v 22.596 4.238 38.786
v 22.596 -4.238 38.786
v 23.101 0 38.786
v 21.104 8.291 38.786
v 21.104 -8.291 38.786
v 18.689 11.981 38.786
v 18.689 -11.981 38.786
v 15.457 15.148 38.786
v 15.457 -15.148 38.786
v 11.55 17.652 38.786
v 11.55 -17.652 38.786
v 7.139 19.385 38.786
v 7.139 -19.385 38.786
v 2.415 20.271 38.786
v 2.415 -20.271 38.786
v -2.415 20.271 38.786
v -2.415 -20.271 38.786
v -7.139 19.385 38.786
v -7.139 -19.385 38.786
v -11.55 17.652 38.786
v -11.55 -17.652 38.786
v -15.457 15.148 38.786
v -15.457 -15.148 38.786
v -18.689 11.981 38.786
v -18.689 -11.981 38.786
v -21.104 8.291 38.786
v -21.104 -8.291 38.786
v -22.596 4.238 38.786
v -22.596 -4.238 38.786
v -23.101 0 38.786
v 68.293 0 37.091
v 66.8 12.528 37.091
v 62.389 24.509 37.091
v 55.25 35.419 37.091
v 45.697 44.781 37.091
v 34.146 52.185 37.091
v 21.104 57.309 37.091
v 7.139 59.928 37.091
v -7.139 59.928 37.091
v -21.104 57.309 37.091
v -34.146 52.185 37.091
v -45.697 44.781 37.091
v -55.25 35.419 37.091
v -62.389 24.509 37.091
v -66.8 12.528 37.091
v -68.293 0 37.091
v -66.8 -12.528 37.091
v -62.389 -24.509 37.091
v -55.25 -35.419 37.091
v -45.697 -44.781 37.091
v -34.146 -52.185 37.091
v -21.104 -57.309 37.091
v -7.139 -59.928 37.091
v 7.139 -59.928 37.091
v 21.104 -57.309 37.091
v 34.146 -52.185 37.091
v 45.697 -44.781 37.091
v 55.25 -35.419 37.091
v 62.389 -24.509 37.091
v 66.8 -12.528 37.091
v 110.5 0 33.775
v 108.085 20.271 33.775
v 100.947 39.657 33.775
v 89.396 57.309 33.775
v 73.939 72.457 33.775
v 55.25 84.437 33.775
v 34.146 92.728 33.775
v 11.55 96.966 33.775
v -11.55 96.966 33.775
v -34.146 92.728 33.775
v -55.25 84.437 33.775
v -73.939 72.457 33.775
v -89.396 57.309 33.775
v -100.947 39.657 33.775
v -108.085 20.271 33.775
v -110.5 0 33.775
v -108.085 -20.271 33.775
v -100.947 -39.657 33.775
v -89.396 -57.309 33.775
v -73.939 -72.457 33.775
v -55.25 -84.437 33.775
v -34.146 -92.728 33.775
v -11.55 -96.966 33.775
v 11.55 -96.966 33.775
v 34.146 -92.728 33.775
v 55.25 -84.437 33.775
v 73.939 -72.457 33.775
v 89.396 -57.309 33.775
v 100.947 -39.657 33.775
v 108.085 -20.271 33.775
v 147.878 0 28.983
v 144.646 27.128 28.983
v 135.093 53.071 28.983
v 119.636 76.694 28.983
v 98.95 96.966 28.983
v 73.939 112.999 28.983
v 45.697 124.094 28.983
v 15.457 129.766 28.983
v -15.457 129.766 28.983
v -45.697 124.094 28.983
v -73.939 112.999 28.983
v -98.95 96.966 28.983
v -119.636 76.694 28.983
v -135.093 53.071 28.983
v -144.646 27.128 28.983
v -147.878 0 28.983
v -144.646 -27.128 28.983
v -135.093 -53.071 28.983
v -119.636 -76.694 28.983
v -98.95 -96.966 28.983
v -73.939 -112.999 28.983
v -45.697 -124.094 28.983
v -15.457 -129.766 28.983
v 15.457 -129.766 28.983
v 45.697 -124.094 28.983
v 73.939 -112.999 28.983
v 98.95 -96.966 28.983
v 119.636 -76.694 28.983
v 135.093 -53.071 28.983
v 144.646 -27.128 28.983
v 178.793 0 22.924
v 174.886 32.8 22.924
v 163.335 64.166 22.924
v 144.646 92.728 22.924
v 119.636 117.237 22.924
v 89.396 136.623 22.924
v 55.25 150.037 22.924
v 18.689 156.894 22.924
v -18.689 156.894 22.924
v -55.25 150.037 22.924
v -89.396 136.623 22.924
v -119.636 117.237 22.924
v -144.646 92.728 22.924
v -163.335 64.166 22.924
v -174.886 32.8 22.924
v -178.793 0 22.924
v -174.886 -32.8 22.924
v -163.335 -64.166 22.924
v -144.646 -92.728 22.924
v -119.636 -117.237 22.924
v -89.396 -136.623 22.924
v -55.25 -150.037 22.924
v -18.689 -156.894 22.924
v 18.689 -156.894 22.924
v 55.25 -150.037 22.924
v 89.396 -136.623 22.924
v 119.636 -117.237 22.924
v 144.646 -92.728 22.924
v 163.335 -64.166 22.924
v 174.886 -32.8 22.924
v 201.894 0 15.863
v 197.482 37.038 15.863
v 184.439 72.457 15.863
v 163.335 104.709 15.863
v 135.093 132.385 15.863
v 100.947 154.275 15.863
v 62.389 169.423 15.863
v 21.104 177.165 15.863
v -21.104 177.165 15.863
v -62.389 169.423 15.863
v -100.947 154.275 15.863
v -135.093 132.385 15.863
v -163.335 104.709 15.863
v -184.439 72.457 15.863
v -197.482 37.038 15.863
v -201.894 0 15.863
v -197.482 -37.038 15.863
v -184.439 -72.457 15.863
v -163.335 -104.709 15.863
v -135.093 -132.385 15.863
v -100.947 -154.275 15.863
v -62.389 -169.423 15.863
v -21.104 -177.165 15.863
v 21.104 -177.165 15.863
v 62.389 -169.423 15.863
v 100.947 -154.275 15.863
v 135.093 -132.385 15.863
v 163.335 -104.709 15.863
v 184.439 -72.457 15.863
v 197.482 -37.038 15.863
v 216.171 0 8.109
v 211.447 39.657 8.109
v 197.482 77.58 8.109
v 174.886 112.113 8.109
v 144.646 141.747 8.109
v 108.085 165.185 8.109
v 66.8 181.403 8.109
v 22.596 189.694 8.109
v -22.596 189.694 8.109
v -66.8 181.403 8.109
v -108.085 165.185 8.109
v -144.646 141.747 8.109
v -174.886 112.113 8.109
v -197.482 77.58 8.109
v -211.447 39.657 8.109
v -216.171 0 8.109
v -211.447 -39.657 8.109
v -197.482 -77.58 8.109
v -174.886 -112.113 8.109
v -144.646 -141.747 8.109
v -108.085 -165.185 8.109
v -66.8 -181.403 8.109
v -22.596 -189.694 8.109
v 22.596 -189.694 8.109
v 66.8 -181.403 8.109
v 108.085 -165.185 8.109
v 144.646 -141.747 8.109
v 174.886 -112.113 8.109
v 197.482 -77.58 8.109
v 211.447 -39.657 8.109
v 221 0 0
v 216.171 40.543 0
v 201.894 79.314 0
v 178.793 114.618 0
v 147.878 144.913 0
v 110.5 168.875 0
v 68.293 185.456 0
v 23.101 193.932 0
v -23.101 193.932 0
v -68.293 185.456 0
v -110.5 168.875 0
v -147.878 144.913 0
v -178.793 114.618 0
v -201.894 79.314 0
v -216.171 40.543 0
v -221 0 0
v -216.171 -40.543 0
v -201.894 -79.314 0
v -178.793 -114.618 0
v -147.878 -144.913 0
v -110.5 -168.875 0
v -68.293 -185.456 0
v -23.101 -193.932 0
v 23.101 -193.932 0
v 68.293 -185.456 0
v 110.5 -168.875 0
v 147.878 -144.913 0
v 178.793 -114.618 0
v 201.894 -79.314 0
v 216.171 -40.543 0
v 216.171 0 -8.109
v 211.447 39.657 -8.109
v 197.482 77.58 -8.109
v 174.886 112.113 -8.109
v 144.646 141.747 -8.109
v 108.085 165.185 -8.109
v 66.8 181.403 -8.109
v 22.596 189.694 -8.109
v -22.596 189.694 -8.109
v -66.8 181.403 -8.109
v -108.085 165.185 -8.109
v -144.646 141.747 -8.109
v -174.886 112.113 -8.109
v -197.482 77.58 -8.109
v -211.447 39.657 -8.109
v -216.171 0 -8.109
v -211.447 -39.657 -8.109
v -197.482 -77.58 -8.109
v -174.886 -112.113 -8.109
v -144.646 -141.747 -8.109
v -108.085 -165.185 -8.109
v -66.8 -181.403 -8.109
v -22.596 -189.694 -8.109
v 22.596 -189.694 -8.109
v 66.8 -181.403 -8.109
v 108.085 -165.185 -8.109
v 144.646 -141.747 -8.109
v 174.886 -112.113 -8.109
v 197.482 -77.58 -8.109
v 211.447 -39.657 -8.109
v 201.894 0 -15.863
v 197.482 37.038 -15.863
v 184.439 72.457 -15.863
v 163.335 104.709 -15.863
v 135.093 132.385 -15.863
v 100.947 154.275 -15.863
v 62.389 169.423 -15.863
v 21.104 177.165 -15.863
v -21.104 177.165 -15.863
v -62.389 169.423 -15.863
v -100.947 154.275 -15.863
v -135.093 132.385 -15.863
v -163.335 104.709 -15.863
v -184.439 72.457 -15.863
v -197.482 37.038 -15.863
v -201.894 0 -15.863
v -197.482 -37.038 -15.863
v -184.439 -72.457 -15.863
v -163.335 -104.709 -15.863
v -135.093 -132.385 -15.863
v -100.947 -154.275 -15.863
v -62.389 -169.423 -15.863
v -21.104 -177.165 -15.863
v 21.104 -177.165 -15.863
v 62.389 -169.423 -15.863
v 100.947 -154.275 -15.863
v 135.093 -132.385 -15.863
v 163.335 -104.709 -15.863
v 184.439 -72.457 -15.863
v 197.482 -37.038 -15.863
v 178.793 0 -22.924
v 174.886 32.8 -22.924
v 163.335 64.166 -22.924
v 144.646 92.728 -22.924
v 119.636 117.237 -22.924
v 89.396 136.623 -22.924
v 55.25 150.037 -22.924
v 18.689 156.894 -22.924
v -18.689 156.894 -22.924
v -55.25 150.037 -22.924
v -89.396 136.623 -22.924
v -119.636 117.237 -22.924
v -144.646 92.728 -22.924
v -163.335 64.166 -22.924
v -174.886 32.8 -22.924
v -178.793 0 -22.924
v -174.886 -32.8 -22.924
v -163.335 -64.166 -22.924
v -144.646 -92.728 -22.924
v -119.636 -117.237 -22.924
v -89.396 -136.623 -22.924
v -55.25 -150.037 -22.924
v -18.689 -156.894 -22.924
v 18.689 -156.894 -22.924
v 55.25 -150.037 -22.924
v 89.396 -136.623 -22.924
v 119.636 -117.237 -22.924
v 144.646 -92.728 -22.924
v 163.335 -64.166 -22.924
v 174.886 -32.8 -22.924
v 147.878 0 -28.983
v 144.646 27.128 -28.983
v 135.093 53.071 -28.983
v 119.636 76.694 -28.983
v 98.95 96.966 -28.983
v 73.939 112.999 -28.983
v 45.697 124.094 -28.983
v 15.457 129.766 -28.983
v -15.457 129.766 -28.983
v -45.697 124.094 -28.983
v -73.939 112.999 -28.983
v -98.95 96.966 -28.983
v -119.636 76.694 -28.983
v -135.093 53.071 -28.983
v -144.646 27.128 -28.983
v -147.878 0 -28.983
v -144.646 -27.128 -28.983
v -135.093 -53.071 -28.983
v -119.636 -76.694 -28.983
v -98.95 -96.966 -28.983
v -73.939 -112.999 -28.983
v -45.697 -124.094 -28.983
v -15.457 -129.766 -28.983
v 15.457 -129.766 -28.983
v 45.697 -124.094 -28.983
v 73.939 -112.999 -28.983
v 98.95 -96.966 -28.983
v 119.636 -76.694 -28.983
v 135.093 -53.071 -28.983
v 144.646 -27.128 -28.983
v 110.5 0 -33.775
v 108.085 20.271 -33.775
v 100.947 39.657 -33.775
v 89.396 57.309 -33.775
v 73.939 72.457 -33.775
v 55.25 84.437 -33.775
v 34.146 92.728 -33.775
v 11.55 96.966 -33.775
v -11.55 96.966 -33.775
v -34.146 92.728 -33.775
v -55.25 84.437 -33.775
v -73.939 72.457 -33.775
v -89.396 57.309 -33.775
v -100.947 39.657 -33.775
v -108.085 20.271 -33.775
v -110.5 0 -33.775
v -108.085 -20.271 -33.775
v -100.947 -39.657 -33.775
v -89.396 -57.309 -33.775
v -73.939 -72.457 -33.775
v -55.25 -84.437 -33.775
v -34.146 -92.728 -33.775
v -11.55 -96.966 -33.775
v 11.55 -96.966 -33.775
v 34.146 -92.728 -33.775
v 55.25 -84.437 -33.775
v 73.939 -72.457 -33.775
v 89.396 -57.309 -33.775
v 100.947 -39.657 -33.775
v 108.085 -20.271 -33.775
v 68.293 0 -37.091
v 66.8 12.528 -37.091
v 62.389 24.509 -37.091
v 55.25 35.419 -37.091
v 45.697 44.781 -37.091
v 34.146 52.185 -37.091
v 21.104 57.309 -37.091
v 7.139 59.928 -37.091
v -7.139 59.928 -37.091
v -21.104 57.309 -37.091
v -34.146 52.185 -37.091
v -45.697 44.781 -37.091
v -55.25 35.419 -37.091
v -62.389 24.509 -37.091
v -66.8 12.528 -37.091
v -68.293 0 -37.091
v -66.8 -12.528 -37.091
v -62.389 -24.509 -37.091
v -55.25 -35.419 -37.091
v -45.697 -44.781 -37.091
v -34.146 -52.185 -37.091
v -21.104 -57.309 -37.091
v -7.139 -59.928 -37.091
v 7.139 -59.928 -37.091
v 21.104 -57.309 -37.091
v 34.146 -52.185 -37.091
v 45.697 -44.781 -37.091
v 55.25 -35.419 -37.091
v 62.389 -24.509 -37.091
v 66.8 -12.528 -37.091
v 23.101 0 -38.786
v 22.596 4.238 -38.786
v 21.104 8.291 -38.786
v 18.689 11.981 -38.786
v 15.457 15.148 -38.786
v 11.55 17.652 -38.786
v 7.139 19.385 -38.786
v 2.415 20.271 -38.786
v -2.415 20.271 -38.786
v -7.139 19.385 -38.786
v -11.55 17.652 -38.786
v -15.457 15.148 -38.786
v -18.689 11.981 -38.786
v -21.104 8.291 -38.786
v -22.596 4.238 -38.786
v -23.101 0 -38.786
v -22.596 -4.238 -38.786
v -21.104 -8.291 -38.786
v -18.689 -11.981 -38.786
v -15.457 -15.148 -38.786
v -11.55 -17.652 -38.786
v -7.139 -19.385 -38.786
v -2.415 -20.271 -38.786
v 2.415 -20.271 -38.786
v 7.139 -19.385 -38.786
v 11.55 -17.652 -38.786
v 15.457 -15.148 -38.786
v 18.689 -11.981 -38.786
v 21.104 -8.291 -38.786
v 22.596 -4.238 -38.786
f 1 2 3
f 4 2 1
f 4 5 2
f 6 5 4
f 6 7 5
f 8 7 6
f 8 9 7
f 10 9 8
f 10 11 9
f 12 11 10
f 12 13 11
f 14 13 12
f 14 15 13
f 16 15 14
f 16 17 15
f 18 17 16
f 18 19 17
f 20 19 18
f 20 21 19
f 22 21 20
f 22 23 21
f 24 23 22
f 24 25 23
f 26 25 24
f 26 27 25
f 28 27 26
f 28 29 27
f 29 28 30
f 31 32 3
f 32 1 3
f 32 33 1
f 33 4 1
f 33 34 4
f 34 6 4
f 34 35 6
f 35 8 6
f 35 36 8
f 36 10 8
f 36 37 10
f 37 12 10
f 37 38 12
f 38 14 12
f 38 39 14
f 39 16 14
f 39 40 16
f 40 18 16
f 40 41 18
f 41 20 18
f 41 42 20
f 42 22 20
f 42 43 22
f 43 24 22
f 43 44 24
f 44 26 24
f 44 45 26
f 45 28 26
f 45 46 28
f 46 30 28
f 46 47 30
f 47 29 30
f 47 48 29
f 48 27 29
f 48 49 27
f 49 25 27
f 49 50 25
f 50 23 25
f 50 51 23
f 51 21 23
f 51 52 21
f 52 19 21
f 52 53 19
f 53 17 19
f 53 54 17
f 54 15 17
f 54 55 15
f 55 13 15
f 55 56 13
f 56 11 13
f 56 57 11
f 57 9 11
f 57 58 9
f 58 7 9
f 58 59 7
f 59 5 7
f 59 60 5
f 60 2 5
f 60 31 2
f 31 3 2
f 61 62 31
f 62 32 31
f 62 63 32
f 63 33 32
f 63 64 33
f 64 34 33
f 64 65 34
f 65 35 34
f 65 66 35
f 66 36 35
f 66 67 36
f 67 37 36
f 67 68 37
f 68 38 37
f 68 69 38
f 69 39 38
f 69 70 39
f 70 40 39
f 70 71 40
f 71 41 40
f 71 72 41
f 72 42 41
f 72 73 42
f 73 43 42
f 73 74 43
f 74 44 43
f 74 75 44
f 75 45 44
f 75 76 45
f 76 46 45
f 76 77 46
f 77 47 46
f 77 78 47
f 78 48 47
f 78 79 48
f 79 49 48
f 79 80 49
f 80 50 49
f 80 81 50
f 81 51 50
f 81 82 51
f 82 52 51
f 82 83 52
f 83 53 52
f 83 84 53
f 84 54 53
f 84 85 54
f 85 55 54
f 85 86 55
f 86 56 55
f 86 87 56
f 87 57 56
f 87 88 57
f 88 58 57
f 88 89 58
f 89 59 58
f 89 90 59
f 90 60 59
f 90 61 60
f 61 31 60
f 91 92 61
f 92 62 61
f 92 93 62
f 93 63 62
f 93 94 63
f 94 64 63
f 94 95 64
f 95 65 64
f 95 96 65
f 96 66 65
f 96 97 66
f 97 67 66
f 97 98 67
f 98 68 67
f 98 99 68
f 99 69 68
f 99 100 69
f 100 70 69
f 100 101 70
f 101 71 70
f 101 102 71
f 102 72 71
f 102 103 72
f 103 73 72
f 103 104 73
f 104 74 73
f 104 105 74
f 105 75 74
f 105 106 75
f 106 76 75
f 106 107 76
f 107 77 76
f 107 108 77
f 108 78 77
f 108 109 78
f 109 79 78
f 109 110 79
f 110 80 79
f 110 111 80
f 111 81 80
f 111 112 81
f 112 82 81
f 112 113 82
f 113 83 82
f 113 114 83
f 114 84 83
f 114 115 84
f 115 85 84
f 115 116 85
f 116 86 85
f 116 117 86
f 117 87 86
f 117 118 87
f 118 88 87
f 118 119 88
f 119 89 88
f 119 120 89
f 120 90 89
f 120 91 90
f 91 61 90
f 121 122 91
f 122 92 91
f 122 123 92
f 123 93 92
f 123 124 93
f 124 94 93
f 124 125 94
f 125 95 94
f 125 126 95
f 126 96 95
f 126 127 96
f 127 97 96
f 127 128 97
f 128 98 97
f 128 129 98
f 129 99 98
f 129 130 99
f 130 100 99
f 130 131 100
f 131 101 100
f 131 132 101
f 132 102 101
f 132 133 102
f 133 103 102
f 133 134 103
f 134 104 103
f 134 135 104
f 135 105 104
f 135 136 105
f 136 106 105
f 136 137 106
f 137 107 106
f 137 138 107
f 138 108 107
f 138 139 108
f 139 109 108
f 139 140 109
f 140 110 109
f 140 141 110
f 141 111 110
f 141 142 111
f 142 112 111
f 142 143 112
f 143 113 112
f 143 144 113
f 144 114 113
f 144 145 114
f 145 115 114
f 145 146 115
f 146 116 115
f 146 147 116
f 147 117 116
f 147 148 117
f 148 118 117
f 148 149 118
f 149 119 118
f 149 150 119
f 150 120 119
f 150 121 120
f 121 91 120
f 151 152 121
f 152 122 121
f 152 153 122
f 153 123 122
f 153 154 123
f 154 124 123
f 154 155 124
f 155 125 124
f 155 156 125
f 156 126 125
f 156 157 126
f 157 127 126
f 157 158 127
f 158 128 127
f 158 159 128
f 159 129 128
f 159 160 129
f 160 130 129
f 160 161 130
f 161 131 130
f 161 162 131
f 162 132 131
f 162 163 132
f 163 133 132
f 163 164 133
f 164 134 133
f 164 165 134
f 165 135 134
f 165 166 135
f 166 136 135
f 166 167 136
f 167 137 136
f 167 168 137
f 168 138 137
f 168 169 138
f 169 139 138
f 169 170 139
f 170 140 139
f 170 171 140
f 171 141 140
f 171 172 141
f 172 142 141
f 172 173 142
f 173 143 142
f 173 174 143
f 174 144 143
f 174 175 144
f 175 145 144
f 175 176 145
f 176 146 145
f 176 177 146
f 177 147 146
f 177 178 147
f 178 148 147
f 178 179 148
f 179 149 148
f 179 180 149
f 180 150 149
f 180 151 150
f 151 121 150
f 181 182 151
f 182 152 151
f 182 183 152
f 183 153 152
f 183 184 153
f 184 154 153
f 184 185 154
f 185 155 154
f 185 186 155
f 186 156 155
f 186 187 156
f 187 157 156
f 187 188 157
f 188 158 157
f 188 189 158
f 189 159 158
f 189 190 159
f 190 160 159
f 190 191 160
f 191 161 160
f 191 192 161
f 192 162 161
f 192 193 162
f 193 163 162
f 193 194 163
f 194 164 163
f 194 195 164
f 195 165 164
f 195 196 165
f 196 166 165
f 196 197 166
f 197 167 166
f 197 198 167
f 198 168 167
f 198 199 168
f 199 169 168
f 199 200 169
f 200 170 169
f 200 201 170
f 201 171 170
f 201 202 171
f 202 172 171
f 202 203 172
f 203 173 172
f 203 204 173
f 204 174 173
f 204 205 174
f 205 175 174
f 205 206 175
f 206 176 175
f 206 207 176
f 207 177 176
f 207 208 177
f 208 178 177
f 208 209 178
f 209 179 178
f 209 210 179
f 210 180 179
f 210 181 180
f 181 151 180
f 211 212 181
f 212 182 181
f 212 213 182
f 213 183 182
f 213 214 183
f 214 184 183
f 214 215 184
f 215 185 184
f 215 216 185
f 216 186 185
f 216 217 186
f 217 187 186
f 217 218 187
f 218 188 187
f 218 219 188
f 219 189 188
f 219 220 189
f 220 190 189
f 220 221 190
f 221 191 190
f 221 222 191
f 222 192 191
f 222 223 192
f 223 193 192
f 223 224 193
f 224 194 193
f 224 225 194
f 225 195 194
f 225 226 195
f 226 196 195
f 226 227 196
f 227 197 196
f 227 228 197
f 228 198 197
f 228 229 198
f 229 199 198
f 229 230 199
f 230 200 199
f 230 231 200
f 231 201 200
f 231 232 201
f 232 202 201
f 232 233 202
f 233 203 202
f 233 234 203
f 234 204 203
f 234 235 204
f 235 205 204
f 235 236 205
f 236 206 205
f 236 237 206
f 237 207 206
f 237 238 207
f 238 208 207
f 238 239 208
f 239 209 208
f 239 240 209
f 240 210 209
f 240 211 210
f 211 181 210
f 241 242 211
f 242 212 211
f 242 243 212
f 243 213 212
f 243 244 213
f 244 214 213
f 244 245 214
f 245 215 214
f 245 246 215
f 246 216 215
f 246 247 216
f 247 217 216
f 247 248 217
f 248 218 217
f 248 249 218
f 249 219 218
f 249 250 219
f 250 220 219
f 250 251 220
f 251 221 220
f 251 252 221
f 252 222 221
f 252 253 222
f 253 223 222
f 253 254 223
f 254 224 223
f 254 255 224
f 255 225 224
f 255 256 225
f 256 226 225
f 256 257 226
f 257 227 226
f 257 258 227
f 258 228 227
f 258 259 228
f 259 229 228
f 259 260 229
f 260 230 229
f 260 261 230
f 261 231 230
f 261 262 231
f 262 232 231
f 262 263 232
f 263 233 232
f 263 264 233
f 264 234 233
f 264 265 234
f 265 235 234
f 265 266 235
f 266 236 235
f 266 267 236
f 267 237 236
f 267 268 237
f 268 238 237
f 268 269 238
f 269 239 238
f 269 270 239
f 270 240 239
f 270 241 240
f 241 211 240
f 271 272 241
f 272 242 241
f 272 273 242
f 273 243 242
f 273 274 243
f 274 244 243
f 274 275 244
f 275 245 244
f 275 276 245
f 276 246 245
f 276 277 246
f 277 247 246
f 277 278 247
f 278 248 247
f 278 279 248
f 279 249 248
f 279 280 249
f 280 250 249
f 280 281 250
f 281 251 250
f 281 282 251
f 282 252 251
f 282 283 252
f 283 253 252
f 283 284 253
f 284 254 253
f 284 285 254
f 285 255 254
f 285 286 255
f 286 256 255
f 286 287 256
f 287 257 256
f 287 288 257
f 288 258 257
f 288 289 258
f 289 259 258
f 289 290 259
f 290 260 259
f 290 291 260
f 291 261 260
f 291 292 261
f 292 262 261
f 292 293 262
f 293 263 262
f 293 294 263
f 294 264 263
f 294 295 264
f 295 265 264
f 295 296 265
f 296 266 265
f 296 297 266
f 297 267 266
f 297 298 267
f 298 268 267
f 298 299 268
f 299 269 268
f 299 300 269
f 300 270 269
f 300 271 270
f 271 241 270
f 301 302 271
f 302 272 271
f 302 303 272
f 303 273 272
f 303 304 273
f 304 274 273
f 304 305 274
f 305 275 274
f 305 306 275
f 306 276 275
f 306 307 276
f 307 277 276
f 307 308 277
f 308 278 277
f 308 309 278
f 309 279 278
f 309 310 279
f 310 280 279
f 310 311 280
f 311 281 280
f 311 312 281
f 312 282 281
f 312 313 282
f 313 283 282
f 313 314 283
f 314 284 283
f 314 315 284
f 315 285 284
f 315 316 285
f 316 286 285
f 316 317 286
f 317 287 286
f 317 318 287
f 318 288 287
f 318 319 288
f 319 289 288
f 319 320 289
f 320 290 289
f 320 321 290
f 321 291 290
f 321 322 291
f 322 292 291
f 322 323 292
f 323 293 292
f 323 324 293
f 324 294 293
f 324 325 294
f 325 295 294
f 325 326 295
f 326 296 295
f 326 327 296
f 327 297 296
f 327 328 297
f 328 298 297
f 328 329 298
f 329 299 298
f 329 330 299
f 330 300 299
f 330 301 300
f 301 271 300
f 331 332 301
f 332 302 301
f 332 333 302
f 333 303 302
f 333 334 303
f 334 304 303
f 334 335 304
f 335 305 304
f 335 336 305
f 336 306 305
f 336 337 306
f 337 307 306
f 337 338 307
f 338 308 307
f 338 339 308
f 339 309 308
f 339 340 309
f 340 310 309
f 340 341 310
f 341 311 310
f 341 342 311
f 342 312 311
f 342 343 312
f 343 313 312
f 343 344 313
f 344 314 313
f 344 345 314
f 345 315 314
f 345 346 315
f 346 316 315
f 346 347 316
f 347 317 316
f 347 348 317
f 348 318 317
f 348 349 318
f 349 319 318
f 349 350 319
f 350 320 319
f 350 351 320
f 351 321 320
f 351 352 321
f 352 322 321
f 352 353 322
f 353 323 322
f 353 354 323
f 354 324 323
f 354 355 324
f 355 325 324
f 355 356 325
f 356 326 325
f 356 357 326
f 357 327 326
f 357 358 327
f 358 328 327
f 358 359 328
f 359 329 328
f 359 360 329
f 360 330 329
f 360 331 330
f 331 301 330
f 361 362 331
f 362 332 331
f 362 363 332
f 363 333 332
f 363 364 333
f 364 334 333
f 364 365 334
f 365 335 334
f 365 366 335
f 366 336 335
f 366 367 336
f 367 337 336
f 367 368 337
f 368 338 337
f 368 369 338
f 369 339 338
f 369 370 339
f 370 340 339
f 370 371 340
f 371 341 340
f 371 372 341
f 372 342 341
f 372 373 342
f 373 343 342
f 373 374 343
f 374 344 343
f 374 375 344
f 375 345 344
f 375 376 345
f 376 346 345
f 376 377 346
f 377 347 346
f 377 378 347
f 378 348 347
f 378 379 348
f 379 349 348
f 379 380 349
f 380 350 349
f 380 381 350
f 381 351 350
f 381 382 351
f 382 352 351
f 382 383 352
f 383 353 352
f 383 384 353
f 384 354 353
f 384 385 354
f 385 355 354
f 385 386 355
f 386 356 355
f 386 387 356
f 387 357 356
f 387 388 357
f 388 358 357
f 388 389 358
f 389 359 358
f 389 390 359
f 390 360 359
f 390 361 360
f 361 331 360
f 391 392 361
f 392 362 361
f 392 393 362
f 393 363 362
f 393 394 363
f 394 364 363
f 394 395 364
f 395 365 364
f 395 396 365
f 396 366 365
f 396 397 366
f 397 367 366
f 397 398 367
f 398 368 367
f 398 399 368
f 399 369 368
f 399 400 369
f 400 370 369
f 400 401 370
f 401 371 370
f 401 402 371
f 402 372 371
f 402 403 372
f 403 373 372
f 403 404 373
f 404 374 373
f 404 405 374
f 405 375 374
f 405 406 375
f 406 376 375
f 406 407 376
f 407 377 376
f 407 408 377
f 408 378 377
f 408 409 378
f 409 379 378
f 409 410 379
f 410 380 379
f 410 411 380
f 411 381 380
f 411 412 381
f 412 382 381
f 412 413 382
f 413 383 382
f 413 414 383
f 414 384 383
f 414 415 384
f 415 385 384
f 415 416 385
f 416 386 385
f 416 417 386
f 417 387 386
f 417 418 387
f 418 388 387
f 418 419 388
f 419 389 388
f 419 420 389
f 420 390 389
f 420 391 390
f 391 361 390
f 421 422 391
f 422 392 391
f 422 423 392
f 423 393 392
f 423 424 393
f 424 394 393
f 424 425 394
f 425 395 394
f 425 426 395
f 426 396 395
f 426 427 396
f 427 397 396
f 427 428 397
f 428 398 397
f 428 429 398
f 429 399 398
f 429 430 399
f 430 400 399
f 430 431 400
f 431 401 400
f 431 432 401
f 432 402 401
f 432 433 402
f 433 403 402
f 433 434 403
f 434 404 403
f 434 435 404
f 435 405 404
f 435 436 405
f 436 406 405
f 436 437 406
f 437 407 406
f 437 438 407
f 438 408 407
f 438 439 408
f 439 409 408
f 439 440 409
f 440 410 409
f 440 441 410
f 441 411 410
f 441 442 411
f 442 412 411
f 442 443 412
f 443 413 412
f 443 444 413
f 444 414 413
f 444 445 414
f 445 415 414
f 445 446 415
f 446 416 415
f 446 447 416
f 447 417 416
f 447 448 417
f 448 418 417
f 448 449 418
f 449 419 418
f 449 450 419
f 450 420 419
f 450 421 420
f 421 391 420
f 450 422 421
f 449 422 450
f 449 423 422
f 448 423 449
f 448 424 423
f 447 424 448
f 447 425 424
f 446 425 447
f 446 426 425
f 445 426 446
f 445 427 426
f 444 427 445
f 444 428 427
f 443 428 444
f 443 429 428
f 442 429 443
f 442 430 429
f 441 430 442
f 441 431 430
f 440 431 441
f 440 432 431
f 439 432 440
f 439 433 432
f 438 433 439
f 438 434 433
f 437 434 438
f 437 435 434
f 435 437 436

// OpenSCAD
// Generated by SolidPython 1.0.1 on 2020-07-29 00:46:53


scale(v = [17, 15, 3]) {
	sphere(r = 13);
}
/***********************************************
*********      SolidPython code:      **********
************************************************
 
# import packages: SolidPython
from solid import *
from solid.utils import *
from itertools import chain, combinations, permutations


class Resize:

    def __init__(self, scad_file):
        self.scad_file = scad_file
        #self.scad_file = import_scad(scad_file)
        # cone/cylinder param:
        self.r1 = 0
        self.r2 = 0
        self.h = 0
        # rectangular prism param:
        self.w = 0
        self.l = 0
        # ellipse param:
        self.r = 0

    # import OpenScad code (file name corresponds to shape)


    # classify shape + parameters
    def assign(self, param1, param2, param3):
        if self.scad_file == 'cone.scad':
            self.r1 = param1
            self.r2 = param2
            self.h = param3
        elif self.scad_file == 'cylinder.scad':
            self.r1 = param1
            self.r2 = param2
            self.h = param3
        elif self.scad_file == 'rectangularPrism.scad':
            self.h = param1
            self.l = param2
            self.w = param3
        else:
            self.r = param1
            self.h = param2

    # resize parameters
    def iterate(self):
        x = range(3, 20, 2)
        i = 1
        if self.scad_file == 'cone.scad':
            tempList = list(permutations(x, 2))
            for temp in tempList:
                param1 = temp[0]
                param2 = temp[1]
                filepath = 'produced_scad_files/' + 'cone' + str(param1) + '_' + str(param2) + '_' + '.scad'
                scad_render_to_file(cylinder(h=param1, r1=param2, r2=0), filepath)

        elif self.scad_file == 'cylinder.scad':
            tempList = list(permutations(x, 3))
            for temp in tempList:
                param1 = temp[0]
                param2 = temp[1]
                filepath = 'produced_scad_files/' + 'cylinder' + str(param1) + '_' + str(param2) + '_' + '.scad'
                scad_render_to_file(cylinder(h=param1, r1=param2, r2=param2), filepath)

        elif self.scad_file == 'rectangularPrism.scad':
            tempList = list(permutations(x, 3))
            for temp in tempList:
                param1 = temp[0]
                param2 = temp[1]
                param3 = temp[2]
                filepath = 'produced_scad_files/' + 'rectangularPrism' + str(param1) + '_' + str(param2) + '_' + str(
                    param3) + '.scad'
                scad_render_to_file(cube(size=(param1, param2, param3)), filepath)

        elif self.scad_file == 'ellipse.scad':
            tempList = list(permutations(x, 4))
            for temp in tempList:
                param1 = temp[0]
                param2 = temp[1]
                param3 = temp[2]
                param4 = temp[3]
                filepath = 'produced_scad_files/' + 'ellipse' + str(param1) + '_' + str(param2) + '_' + str(param3) + '_' + str(param4) + '.scad'
                scad_render_to_file(scale([param1, param2, param3])(sphere(r=param4)), filepath)

    def render_to_scadfile(self):
        scad_render_to_file(scad, 'example.scad') 
 
************************************************/
